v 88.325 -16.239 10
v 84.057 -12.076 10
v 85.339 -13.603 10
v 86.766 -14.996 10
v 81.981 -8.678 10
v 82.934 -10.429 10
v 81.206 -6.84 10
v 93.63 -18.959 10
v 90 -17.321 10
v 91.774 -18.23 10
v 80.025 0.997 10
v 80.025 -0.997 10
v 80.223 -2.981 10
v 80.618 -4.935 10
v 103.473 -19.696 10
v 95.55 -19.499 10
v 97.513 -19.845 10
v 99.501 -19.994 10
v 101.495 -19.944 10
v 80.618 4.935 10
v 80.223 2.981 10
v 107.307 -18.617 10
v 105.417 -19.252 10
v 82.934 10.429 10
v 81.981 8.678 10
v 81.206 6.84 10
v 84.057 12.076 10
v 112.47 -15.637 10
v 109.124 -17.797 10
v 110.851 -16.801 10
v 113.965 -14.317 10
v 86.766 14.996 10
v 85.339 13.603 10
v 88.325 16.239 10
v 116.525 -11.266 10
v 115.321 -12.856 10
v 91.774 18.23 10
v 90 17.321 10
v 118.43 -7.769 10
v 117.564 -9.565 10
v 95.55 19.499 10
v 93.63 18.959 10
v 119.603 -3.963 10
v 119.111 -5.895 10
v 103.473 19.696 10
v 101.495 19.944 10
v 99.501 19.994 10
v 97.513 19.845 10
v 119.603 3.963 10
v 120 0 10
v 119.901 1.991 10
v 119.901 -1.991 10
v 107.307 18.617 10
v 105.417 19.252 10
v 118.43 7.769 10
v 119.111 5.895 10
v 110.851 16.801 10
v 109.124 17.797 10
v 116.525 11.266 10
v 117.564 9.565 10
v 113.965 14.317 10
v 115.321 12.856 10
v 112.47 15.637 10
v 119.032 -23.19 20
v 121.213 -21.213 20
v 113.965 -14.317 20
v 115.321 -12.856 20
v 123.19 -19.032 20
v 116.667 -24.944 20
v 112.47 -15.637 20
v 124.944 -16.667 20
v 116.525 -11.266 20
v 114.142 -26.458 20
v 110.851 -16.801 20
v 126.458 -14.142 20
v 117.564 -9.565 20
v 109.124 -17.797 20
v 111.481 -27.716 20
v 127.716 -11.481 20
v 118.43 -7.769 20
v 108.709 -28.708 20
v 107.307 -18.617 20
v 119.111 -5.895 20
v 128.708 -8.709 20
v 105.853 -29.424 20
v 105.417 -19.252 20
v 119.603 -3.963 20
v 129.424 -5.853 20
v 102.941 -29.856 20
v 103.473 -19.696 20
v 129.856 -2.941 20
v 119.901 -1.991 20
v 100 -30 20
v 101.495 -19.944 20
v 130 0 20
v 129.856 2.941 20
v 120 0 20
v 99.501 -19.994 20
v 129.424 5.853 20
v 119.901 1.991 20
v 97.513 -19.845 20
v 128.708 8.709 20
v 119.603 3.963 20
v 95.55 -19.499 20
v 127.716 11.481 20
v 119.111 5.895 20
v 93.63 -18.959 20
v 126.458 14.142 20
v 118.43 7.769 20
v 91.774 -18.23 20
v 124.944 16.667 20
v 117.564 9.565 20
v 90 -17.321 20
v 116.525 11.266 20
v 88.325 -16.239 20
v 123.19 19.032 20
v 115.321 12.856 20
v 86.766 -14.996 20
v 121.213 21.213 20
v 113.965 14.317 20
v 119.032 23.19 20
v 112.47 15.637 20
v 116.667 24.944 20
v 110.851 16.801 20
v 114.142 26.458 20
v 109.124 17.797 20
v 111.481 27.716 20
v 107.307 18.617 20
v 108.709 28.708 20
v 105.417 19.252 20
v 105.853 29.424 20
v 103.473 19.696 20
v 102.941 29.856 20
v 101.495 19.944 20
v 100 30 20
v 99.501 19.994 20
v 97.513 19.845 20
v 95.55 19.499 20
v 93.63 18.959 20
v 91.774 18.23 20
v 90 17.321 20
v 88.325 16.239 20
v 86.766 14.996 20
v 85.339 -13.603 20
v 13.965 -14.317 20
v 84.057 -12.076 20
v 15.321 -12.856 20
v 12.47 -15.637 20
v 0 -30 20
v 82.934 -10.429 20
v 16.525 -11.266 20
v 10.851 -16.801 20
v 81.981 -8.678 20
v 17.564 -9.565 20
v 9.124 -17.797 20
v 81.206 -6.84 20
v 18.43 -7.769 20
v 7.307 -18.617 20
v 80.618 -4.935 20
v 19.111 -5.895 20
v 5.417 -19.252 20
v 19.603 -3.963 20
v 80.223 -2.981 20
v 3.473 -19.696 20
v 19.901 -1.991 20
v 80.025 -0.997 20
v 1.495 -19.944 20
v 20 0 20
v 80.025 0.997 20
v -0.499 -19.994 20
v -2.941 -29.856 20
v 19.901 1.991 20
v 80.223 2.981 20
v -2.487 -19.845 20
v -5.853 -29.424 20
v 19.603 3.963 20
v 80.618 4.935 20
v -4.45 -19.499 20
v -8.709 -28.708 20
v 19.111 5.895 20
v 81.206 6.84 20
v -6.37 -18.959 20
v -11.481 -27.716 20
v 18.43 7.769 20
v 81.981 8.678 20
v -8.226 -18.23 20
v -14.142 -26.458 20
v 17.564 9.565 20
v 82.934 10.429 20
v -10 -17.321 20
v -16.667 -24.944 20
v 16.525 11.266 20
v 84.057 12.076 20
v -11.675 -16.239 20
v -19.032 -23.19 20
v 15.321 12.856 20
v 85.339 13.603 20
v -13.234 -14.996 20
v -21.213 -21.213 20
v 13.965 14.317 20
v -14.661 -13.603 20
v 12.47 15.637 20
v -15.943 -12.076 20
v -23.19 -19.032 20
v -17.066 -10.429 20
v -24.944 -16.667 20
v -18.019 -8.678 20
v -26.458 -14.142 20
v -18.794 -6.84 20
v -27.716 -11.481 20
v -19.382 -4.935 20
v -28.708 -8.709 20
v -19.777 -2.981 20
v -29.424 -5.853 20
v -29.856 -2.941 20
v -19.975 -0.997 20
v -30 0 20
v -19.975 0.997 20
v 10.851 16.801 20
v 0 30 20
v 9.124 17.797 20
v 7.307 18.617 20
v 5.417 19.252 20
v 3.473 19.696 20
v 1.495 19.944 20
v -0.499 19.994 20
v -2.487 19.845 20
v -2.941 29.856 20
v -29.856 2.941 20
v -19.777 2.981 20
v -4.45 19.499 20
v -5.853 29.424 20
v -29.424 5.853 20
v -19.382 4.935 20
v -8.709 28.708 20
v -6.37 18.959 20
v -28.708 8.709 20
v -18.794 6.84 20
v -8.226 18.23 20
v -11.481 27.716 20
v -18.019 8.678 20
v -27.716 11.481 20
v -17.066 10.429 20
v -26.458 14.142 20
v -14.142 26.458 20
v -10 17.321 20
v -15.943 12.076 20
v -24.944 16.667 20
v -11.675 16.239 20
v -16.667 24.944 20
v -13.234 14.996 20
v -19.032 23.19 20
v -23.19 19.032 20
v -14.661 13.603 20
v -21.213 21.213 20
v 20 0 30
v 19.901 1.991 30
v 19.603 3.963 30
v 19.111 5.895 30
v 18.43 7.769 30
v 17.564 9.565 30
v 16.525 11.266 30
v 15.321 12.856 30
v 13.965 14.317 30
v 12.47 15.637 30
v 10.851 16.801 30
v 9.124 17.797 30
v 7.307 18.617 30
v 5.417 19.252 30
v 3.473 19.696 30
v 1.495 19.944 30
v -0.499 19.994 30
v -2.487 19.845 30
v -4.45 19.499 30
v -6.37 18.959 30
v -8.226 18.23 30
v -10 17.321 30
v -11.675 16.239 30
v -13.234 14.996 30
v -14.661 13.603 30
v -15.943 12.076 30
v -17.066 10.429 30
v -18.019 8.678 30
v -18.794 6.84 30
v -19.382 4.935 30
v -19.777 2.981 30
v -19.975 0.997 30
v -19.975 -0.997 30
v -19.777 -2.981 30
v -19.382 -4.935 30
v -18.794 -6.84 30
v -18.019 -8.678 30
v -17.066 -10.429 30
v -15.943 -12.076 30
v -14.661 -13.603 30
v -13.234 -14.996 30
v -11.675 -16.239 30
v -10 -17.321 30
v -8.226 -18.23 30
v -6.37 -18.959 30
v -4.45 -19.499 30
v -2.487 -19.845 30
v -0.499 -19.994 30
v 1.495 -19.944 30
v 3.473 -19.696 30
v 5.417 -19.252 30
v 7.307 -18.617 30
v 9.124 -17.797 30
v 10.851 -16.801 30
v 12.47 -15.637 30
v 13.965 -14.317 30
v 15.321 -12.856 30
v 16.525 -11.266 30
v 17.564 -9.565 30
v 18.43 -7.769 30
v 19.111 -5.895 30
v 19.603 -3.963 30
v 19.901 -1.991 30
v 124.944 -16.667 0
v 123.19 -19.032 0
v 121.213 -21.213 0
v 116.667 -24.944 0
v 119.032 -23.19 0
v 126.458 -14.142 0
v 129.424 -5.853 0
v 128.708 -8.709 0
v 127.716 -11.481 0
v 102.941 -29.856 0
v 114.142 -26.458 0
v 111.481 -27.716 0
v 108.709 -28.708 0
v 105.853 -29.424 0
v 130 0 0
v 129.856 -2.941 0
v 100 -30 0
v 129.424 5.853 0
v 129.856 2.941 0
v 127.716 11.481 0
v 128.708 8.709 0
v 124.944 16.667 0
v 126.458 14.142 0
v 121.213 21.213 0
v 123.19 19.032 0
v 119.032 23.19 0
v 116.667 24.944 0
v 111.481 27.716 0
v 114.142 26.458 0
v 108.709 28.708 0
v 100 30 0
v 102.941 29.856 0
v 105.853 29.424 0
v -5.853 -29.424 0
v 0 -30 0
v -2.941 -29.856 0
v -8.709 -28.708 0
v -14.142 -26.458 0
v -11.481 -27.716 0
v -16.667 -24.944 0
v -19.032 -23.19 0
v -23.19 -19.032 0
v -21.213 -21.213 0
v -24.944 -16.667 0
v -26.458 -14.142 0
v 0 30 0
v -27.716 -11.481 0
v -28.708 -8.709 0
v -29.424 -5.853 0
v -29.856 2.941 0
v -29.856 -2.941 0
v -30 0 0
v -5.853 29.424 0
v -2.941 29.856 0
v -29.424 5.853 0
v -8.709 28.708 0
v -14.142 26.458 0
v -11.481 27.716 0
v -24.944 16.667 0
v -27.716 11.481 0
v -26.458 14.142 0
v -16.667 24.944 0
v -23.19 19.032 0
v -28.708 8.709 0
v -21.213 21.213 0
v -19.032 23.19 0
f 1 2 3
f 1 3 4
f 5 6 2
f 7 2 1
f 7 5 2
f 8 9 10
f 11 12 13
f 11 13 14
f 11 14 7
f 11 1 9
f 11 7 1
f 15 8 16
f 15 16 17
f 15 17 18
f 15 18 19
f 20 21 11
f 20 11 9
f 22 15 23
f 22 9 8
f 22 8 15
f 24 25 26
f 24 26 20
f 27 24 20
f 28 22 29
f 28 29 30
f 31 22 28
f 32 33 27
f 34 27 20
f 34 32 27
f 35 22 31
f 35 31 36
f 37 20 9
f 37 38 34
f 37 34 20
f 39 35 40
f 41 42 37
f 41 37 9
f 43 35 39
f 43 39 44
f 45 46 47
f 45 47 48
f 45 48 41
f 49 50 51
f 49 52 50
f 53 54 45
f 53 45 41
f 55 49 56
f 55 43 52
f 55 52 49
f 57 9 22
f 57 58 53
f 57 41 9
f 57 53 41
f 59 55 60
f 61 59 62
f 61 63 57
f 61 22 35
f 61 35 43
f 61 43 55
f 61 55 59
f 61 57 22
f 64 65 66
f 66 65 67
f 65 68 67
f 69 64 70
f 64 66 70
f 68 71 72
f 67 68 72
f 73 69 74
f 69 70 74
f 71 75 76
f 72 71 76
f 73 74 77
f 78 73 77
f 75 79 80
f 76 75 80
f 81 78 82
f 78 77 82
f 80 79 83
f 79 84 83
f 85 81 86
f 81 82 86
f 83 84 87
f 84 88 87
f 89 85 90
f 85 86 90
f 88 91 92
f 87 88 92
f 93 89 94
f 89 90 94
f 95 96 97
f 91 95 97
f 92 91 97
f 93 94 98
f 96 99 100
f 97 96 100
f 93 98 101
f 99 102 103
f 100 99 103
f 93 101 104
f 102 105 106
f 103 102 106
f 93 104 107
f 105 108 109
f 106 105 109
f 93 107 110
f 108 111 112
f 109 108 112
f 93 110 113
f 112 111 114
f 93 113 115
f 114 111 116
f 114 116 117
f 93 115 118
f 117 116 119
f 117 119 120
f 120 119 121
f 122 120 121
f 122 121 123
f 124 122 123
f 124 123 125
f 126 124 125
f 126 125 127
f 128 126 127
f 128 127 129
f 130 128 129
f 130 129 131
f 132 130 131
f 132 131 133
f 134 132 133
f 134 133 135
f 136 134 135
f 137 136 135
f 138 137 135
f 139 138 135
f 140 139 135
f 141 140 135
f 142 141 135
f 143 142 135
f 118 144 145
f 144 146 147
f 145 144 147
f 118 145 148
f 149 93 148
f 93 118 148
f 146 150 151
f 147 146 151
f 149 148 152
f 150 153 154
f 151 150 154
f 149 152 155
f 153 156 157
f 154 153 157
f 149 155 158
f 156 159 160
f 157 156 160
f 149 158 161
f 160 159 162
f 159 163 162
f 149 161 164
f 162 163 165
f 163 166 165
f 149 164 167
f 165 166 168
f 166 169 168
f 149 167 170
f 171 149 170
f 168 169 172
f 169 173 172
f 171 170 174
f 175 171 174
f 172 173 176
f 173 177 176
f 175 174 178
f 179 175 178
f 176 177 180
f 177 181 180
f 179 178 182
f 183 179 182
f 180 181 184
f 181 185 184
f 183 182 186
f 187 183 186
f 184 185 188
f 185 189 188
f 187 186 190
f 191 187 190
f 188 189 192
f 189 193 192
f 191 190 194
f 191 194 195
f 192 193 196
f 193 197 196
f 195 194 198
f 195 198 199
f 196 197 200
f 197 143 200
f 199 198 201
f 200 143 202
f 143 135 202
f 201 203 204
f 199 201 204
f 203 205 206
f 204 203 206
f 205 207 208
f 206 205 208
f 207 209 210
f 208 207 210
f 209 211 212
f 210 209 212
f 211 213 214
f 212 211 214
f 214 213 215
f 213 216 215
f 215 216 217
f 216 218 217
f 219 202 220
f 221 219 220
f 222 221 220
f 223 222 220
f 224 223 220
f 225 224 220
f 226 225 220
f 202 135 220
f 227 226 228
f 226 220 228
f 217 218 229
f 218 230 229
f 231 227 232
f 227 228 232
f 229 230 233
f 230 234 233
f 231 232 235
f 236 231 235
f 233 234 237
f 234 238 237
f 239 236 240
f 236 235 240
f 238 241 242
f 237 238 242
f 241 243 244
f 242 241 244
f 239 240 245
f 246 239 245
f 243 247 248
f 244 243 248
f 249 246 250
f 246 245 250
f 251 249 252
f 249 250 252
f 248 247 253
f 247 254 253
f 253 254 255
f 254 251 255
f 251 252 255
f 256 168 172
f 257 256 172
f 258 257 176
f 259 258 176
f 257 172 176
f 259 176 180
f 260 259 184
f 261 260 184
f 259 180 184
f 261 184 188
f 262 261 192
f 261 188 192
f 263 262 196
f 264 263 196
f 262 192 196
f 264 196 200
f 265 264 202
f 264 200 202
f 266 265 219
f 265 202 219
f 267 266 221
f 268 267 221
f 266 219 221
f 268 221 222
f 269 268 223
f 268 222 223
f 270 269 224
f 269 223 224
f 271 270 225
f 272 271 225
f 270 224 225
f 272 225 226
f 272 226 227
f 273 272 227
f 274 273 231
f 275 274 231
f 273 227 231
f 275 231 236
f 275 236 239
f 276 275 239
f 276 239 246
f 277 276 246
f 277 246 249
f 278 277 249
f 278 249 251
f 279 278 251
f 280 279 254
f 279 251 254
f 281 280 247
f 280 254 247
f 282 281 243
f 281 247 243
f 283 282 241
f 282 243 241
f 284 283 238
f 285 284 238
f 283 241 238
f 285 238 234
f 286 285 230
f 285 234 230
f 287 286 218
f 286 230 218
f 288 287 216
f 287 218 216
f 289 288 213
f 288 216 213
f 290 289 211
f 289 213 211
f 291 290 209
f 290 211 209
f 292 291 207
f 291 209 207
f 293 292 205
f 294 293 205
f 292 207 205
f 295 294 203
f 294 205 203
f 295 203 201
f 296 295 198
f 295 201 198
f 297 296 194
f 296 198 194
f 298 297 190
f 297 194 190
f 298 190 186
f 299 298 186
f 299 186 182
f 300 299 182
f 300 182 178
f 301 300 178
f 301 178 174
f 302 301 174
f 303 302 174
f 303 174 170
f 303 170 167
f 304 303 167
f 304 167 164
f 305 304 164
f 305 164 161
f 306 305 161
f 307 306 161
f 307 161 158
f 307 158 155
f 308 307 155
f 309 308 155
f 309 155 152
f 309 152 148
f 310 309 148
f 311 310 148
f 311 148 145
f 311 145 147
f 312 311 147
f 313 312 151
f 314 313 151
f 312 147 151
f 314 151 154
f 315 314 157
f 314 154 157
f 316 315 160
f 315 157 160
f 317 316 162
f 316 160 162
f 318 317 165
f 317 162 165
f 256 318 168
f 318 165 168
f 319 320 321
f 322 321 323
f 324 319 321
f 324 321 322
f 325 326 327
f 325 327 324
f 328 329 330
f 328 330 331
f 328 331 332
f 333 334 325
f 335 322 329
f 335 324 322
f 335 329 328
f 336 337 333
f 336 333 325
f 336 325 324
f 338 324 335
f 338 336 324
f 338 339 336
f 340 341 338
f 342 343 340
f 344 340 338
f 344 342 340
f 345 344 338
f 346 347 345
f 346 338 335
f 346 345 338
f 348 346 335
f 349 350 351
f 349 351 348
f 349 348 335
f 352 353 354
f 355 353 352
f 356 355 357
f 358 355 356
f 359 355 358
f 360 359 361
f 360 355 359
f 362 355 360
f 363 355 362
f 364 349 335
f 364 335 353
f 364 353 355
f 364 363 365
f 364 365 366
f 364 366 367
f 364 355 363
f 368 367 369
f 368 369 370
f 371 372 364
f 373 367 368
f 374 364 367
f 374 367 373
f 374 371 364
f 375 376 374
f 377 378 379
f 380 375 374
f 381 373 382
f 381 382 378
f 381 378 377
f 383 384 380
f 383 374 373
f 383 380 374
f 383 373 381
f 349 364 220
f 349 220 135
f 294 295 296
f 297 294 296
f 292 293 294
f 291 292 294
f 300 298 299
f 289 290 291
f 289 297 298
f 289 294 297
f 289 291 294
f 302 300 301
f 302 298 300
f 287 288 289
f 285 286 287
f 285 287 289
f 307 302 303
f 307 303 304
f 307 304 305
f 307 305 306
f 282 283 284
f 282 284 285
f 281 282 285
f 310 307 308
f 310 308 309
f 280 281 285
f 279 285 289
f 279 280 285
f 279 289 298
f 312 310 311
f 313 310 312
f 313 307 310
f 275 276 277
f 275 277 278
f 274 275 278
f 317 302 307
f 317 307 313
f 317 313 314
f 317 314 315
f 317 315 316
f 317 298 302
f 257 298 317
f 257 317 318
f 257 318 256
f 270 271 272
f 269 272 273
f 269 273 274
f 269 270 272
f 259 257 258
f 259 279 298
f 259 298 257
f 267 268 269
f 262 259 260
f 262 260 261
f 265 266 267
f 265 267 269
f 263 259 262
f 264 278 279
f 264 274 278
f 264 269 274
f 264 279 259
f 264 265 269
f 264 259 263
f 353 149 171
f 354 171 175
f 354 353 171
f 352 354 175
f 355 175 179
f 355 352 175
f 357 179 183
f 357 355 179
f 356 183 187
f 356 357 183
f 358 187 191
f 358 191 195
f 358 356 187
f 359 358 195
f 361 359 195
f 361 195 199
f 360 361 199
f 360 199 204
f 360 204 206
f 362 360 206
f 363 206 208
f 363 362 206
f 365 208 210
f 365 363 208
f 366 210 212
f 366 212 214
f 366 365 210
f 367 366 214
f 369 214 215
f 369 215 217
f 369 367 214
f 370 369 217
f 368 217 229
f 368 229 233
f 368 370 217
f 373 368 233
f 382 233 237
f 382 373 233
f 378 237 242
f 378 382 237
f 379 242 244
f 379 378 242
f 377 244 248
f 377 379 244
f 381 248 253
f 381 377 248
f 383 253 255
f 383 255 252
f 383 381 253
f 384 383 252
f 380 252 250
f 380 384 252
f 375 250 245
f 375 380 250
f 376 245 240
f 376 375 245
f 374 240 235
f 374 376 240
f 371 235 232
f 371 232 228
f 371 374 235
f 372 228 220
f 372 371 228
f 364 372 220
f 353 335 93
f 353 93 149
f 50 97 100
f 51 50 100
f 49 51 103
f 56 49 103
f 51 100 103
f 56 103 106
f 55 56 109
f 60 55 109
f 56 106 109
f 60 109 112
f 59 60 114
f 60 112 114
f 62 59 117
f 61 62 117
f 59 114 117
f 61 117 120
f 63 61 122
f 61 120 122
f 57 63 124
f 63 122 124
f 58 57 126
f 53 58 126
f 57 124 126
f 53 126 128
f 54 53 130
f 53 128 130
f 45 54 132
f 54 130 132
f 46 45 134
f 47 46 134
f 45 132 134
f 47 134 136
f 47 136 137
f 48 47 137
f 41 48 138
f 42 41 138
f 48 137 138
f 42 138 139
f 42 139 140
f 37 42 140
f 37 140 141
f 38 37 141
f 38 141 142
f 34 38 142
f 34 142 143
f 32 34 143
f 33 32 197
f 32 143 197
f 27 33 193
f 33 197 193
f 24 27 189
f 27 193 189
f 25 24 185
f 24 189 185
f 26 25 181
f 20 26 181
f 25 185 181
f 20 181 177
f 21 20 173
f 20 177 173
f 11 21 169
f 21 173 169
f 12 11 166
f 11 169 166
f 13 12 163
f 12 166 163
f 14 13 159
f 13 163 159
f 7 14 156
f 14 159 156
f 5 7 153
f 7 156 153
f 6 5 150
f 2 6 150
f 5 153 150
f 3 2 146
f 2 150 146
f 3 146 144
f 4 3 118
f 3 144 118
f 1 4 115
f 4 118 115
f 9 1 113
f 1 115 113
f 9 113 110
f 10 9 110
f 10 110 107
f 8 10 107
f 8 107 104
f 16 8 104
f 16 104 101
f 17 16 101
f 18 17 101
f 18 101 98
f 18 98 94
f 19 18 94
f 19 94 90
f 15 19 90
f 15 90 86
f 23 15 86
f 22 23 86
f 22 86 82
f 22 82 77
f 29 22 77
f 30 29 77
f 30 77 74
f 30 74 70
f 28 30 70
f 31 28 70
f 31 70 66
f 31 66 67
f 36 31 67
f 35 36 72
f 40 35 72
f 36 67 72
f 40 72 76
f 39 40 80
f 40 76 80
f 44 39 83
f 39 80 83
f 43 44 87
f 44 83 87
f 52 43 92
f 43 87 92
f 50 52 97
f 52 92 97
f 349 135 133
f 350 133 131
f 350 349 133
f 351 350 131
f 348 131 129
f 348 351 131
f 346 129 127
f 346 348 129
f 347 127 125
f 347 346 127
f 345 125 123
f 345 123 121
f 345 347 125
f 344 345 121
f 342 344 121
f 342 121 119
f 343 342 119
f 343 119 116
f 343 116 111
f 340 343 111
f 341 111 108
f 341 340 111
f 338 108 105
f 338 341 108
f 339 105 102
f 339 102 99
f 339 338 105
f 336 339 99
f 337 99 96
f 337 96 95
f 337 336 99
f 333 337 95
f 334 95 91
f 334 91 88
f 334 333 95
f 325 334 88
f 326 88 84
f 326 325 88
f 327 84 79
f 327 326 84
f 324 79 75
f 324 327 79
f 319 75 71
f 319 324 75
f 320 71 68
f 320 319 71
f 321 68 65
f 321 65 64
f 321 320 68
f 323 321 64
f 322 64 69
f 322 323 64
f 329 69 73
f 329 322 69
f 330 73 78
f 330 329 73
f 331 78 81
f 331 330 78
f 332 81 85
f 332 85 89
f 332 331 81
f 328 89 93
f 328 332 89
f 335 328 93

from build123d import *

# Parameters (mm, degrees)
SALIENTE_EXTRUIR1_DEPTH = 20
CROQUIS2_R              = 20
SALIENTE_EXTRUIR2_DEPTH = 10
CROQUIS3_R              = 20
CORTAR_EXTRUIR1_DEPTH   = 10


with BuildPart() as part:
    # Croquis1 → Saliente-Extruir1 (new body)
    with BuildSketch(Plane.XY):
        with BuildLine():
            Line((0, 30), (100, 30))
            ThreePointArc((100, 30), (130, 0), (100, -30))
            Line((100, -30), (0, -30))
            ThreePointArc((0, -30), (-30, 0), (0, 30))
        make_face()
    extrude(amount=SALIENTE_EXTRUIR1_DEPTH)

    # Croquis2 → Saliente-Extruir2 (add)
    with BuildSketch(Plane.XY.offset(20)):
        Circle(CROQUIS2_R)
    extrude(amount=SALIENTE_EXTRUIR2_DEPTH)

    # Croquis3 → Cortar-Extruir1 (cut)
    with BuildSketch(Plane.XY.offset(20)):
        with Locations((100, 0)):
            Circle(CROQUIS3_R)
    extrude(amount=-CORTAR_EXTRUIR1_DEPTH, mode=Mode.SUBTRACT)


solid = part.part
